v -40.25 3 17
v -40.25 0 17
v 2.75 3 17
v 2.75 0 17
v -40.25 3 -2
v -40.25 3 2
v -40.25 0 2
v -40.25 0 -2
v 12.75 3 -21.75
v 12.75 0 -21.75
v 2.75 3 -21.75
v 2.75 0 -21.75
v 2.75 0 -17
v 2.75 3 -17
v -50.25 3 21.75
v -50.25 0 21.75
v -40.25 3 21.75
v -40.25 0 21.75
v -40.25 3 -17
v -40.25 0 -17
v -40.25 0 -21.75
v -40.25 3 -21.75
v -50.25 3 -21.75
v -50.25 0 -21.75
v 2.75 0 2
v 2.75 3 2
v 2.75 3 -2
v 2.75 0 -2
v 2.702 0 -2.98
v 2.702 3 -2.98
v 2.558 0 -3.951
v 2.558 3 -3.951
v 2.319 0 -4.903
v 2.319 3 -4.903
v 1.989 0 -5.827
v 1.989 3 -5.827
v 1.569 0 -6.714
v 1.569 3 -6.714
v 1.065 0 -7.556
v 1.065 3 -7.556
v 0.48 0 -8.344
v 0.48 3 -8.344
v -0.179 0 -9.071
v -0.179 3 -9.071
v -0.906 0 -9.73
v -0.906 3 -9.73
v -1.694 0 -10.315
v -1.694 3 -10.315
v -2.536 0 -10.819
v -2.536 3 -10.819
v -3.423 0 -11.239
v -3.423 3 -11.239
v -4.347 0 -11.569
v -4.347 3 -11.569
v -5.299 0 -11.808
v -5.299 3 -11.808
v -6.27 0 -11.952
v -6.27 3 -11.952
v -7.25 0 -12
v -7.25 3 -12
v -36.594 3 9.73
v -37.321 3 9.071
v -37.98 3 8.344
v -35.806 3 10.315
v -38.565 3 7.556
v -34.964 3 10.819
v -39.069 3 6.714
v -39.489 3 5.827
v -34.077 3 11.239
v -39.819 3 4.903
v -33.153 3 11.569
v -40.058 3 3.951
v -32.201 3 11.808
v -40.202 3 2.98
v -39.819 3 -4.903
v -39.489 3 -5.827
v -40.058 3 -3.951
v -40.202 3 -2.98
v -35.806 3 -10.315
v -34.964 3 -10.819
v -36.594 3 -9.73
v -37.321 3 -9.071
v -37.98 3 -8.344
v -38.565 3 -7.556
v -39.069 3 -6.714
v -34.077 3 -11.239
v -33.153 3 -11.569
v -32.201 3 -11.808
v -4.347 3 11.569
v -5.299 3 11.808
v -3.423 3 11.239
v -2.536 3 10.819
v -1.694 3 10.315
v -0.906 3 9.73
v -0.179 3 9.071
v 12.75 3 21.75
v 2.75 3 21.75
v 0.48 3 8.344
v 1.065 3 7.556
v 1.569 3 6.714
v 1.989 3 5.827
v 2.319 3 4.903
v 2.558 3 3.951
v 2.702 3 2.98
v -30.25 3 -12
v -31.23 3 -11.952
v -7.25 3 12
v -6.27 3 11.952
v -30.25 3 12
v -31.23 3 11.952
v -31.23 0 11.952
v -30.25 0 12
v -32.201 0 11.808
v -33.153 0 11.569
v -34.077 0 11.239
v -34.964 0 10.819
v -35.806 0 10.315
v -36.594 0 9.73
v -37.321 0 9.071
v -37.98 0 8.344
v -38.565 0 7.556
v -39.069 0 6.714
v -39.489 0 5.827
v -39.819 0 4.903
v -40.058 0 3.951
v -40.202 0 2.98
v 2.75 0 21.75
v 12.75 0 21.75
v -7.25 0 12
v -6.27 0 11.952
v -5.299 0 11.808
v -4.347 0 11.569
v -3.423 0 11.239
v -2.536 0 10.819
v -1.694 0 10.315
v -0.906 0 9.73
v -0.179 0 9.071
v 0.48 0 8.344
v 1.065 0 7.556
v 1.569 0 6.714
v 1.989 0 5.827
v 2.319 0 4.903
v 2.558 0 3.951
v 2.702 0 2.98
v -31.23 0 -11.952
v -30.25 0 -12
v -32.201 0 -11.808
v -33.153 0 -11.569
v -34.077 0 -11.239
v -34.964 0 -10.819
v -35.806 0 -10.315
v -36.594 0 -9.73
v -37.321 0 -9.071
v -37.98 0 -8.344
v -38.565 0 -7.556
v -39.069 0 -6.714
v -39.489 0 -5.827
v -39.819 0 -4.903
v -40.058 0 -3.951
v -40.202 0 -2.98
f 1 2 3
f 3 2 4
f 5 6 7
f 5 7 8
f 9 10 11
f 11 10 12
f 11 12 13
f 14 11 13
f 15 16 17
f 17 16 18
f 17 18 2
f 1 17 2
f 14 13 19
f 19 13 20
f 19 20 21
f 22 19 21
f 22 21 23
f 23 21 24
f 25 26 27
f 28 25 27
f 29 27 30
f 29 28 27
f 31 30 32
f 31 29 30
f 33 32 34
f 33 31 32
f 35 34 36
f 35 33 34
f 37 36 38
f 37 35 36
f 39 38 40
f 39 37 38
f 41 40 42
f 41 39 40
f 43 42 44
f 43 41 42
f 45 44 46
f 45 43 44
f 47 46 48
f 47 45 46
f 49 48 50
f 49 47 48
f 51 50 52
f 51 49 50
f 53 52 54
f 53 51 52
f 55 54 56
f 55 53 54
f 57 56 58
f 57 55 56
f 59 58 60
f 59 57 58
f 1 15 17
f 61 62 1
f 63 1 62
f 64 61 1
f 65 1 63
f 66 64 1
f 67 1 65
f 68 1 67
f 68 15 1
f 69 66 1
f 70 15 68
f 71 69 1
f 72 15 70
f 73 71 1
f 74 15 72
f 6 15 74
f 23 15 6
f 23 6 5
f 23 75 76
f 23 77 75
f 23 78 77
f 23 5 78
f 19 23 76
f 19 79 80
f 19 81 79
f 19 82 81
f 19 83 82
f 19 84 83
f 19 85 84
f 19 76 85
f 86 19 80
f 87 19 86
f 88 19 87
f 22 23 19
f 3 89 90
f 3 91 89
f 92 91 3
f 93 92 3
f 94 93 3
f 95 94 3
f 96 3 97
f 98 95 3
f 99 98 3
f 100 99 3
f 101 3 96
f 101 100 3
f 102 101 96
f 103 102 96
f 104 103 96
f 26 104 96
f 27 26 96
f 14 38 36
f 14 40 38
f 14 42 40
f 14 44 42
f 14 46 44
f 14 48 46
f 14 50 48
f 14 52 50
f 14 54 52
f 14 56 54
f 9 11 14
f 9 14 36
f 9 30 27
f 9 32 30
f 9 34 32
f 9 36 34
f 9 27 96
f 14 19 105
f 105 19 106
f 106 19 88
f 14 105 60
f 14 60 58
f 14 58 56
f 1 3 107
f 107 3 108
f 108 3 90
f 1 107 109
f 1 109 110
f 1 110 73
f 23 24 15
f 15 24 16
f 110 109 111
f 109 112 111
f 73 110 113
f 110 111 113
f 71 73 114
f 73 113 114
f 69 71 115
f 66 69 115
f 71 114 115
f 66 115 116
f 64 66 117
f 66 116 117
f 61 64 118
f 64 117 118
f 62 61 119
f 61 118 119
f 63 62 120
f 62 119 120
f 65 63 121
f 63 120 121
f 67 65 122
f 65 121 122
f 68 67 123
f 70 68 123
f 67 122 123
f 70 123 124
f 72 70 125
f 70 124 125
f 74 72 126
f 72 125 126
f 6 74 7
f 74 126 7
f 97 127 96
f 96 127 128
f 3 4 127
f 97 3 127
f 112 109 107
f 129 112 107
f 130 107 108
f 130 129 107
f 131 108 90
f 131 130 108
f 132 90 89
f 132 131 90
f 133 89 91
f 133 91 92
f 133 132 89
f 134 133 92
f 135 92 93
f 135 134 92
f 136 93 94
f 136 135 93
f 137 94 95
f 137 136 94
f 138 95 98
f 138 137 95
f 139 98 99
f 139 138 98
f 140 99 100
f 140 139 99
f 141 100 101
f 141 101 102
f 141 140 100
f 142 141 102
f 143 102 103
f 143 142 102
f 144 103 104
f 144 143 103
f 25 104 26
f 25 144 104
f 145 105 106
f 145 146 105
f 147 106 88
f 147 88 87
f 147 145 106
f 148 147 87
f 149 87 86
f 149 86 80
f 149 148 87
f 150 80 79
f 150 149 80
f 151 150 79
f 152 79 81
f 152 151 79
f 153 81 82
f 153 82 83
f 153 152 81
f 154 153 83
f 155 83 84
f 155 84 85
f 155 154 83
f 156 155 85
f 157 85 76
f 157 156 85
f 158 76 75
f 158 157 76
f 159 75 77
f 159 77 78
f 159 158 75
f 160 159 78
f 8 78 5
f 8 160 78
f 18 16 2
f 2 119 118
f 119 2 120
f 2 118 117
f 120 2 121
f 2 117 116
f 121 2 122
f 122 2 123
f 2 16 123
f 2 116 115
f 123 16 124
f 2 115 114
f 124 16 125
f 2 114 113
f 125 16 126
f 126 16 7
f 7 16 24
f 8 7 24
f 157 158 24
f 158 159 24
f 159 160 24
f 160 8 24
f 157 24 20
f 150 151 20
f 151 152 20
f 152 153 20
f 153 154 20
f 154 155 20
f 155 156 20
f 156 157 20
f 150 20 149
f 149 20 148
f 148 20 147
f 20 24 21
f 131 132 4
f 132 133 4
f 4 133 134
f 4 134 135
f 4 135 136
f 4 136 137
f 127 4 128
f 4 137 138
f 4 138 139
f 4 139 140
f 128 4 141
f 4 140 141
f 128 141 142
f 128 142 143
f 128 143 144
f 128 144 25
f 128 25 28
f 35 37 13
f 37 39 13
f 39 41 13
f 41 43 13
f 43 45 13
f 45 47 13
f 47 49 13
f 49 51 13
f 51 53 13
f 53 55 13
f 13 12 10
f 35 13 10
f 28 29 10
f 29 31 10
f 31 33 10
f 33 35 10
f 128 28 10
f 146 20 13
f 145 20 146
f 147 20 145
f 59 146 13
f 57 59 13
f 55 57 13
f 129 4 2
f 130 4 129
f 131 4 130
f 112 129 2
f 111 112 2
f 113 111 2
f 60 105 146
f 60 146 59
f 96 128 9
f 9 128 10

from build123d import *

# Parameters (mm, degrees)
BOSS_EXTRUDE1_DEPTH = 3
SKETCH5_W           = 43
SKETCH5_H           = 24
CUT_EXTRUDE4_DEPTH  = 3
FILLET1_R           = 10


with BuildPart() as part:
    # Sketch1 → Boss-Extrude1 (new body)
    with BuildSketch(Plane(origin=(0, 0, 0), x_dir=(1, 0, 0), z_dir=(0, 1, 0))):
        Polygon((12.75, -17), (12.75, 17), (12.75, 21.75), (2.75, 21.75), (2.75, 17), (-40.25, 17), (-40.25, 21.75), (-50.25, 21.75), (-50.25, 17), (-50.25, -17), (-50.25, -21.75), (-40.25, -21.75), (-40.25, -17), (2.75, -17), (2.75, -21.75), (12.75, -21.75), align=None)
    extrude(amount=BOSS_EXTRUDE1_DEPTH)

    # Sketch5 → Cut-Extrude4 (cut)
    with BuildSketch(Plane(origin=(0, 3, 0), x_dir=(1, 0, 0), z_dir=(0, 1, 0))):
        with Locations((-18.75, 0)):
            Rectangle(SKETCH5_W, SKETCH5_H)
    extrude(amount=-CUT_EXTRUDE4_DEPTH, mode=Mode.SUBTRACT)

    # Fillet1
    fillet1_edges = [part.edges().sort_by_distance(p)[0] for p in [
        (2.75, 1.5, 12),
        (-40.25, 1.5, 12),
        (-40.25, 1.5, -12),
        (2.75, 1.5, -12),
    ]]
    fillet(fillet1_edges, radius=FILLET1_R)


solid = part.part
